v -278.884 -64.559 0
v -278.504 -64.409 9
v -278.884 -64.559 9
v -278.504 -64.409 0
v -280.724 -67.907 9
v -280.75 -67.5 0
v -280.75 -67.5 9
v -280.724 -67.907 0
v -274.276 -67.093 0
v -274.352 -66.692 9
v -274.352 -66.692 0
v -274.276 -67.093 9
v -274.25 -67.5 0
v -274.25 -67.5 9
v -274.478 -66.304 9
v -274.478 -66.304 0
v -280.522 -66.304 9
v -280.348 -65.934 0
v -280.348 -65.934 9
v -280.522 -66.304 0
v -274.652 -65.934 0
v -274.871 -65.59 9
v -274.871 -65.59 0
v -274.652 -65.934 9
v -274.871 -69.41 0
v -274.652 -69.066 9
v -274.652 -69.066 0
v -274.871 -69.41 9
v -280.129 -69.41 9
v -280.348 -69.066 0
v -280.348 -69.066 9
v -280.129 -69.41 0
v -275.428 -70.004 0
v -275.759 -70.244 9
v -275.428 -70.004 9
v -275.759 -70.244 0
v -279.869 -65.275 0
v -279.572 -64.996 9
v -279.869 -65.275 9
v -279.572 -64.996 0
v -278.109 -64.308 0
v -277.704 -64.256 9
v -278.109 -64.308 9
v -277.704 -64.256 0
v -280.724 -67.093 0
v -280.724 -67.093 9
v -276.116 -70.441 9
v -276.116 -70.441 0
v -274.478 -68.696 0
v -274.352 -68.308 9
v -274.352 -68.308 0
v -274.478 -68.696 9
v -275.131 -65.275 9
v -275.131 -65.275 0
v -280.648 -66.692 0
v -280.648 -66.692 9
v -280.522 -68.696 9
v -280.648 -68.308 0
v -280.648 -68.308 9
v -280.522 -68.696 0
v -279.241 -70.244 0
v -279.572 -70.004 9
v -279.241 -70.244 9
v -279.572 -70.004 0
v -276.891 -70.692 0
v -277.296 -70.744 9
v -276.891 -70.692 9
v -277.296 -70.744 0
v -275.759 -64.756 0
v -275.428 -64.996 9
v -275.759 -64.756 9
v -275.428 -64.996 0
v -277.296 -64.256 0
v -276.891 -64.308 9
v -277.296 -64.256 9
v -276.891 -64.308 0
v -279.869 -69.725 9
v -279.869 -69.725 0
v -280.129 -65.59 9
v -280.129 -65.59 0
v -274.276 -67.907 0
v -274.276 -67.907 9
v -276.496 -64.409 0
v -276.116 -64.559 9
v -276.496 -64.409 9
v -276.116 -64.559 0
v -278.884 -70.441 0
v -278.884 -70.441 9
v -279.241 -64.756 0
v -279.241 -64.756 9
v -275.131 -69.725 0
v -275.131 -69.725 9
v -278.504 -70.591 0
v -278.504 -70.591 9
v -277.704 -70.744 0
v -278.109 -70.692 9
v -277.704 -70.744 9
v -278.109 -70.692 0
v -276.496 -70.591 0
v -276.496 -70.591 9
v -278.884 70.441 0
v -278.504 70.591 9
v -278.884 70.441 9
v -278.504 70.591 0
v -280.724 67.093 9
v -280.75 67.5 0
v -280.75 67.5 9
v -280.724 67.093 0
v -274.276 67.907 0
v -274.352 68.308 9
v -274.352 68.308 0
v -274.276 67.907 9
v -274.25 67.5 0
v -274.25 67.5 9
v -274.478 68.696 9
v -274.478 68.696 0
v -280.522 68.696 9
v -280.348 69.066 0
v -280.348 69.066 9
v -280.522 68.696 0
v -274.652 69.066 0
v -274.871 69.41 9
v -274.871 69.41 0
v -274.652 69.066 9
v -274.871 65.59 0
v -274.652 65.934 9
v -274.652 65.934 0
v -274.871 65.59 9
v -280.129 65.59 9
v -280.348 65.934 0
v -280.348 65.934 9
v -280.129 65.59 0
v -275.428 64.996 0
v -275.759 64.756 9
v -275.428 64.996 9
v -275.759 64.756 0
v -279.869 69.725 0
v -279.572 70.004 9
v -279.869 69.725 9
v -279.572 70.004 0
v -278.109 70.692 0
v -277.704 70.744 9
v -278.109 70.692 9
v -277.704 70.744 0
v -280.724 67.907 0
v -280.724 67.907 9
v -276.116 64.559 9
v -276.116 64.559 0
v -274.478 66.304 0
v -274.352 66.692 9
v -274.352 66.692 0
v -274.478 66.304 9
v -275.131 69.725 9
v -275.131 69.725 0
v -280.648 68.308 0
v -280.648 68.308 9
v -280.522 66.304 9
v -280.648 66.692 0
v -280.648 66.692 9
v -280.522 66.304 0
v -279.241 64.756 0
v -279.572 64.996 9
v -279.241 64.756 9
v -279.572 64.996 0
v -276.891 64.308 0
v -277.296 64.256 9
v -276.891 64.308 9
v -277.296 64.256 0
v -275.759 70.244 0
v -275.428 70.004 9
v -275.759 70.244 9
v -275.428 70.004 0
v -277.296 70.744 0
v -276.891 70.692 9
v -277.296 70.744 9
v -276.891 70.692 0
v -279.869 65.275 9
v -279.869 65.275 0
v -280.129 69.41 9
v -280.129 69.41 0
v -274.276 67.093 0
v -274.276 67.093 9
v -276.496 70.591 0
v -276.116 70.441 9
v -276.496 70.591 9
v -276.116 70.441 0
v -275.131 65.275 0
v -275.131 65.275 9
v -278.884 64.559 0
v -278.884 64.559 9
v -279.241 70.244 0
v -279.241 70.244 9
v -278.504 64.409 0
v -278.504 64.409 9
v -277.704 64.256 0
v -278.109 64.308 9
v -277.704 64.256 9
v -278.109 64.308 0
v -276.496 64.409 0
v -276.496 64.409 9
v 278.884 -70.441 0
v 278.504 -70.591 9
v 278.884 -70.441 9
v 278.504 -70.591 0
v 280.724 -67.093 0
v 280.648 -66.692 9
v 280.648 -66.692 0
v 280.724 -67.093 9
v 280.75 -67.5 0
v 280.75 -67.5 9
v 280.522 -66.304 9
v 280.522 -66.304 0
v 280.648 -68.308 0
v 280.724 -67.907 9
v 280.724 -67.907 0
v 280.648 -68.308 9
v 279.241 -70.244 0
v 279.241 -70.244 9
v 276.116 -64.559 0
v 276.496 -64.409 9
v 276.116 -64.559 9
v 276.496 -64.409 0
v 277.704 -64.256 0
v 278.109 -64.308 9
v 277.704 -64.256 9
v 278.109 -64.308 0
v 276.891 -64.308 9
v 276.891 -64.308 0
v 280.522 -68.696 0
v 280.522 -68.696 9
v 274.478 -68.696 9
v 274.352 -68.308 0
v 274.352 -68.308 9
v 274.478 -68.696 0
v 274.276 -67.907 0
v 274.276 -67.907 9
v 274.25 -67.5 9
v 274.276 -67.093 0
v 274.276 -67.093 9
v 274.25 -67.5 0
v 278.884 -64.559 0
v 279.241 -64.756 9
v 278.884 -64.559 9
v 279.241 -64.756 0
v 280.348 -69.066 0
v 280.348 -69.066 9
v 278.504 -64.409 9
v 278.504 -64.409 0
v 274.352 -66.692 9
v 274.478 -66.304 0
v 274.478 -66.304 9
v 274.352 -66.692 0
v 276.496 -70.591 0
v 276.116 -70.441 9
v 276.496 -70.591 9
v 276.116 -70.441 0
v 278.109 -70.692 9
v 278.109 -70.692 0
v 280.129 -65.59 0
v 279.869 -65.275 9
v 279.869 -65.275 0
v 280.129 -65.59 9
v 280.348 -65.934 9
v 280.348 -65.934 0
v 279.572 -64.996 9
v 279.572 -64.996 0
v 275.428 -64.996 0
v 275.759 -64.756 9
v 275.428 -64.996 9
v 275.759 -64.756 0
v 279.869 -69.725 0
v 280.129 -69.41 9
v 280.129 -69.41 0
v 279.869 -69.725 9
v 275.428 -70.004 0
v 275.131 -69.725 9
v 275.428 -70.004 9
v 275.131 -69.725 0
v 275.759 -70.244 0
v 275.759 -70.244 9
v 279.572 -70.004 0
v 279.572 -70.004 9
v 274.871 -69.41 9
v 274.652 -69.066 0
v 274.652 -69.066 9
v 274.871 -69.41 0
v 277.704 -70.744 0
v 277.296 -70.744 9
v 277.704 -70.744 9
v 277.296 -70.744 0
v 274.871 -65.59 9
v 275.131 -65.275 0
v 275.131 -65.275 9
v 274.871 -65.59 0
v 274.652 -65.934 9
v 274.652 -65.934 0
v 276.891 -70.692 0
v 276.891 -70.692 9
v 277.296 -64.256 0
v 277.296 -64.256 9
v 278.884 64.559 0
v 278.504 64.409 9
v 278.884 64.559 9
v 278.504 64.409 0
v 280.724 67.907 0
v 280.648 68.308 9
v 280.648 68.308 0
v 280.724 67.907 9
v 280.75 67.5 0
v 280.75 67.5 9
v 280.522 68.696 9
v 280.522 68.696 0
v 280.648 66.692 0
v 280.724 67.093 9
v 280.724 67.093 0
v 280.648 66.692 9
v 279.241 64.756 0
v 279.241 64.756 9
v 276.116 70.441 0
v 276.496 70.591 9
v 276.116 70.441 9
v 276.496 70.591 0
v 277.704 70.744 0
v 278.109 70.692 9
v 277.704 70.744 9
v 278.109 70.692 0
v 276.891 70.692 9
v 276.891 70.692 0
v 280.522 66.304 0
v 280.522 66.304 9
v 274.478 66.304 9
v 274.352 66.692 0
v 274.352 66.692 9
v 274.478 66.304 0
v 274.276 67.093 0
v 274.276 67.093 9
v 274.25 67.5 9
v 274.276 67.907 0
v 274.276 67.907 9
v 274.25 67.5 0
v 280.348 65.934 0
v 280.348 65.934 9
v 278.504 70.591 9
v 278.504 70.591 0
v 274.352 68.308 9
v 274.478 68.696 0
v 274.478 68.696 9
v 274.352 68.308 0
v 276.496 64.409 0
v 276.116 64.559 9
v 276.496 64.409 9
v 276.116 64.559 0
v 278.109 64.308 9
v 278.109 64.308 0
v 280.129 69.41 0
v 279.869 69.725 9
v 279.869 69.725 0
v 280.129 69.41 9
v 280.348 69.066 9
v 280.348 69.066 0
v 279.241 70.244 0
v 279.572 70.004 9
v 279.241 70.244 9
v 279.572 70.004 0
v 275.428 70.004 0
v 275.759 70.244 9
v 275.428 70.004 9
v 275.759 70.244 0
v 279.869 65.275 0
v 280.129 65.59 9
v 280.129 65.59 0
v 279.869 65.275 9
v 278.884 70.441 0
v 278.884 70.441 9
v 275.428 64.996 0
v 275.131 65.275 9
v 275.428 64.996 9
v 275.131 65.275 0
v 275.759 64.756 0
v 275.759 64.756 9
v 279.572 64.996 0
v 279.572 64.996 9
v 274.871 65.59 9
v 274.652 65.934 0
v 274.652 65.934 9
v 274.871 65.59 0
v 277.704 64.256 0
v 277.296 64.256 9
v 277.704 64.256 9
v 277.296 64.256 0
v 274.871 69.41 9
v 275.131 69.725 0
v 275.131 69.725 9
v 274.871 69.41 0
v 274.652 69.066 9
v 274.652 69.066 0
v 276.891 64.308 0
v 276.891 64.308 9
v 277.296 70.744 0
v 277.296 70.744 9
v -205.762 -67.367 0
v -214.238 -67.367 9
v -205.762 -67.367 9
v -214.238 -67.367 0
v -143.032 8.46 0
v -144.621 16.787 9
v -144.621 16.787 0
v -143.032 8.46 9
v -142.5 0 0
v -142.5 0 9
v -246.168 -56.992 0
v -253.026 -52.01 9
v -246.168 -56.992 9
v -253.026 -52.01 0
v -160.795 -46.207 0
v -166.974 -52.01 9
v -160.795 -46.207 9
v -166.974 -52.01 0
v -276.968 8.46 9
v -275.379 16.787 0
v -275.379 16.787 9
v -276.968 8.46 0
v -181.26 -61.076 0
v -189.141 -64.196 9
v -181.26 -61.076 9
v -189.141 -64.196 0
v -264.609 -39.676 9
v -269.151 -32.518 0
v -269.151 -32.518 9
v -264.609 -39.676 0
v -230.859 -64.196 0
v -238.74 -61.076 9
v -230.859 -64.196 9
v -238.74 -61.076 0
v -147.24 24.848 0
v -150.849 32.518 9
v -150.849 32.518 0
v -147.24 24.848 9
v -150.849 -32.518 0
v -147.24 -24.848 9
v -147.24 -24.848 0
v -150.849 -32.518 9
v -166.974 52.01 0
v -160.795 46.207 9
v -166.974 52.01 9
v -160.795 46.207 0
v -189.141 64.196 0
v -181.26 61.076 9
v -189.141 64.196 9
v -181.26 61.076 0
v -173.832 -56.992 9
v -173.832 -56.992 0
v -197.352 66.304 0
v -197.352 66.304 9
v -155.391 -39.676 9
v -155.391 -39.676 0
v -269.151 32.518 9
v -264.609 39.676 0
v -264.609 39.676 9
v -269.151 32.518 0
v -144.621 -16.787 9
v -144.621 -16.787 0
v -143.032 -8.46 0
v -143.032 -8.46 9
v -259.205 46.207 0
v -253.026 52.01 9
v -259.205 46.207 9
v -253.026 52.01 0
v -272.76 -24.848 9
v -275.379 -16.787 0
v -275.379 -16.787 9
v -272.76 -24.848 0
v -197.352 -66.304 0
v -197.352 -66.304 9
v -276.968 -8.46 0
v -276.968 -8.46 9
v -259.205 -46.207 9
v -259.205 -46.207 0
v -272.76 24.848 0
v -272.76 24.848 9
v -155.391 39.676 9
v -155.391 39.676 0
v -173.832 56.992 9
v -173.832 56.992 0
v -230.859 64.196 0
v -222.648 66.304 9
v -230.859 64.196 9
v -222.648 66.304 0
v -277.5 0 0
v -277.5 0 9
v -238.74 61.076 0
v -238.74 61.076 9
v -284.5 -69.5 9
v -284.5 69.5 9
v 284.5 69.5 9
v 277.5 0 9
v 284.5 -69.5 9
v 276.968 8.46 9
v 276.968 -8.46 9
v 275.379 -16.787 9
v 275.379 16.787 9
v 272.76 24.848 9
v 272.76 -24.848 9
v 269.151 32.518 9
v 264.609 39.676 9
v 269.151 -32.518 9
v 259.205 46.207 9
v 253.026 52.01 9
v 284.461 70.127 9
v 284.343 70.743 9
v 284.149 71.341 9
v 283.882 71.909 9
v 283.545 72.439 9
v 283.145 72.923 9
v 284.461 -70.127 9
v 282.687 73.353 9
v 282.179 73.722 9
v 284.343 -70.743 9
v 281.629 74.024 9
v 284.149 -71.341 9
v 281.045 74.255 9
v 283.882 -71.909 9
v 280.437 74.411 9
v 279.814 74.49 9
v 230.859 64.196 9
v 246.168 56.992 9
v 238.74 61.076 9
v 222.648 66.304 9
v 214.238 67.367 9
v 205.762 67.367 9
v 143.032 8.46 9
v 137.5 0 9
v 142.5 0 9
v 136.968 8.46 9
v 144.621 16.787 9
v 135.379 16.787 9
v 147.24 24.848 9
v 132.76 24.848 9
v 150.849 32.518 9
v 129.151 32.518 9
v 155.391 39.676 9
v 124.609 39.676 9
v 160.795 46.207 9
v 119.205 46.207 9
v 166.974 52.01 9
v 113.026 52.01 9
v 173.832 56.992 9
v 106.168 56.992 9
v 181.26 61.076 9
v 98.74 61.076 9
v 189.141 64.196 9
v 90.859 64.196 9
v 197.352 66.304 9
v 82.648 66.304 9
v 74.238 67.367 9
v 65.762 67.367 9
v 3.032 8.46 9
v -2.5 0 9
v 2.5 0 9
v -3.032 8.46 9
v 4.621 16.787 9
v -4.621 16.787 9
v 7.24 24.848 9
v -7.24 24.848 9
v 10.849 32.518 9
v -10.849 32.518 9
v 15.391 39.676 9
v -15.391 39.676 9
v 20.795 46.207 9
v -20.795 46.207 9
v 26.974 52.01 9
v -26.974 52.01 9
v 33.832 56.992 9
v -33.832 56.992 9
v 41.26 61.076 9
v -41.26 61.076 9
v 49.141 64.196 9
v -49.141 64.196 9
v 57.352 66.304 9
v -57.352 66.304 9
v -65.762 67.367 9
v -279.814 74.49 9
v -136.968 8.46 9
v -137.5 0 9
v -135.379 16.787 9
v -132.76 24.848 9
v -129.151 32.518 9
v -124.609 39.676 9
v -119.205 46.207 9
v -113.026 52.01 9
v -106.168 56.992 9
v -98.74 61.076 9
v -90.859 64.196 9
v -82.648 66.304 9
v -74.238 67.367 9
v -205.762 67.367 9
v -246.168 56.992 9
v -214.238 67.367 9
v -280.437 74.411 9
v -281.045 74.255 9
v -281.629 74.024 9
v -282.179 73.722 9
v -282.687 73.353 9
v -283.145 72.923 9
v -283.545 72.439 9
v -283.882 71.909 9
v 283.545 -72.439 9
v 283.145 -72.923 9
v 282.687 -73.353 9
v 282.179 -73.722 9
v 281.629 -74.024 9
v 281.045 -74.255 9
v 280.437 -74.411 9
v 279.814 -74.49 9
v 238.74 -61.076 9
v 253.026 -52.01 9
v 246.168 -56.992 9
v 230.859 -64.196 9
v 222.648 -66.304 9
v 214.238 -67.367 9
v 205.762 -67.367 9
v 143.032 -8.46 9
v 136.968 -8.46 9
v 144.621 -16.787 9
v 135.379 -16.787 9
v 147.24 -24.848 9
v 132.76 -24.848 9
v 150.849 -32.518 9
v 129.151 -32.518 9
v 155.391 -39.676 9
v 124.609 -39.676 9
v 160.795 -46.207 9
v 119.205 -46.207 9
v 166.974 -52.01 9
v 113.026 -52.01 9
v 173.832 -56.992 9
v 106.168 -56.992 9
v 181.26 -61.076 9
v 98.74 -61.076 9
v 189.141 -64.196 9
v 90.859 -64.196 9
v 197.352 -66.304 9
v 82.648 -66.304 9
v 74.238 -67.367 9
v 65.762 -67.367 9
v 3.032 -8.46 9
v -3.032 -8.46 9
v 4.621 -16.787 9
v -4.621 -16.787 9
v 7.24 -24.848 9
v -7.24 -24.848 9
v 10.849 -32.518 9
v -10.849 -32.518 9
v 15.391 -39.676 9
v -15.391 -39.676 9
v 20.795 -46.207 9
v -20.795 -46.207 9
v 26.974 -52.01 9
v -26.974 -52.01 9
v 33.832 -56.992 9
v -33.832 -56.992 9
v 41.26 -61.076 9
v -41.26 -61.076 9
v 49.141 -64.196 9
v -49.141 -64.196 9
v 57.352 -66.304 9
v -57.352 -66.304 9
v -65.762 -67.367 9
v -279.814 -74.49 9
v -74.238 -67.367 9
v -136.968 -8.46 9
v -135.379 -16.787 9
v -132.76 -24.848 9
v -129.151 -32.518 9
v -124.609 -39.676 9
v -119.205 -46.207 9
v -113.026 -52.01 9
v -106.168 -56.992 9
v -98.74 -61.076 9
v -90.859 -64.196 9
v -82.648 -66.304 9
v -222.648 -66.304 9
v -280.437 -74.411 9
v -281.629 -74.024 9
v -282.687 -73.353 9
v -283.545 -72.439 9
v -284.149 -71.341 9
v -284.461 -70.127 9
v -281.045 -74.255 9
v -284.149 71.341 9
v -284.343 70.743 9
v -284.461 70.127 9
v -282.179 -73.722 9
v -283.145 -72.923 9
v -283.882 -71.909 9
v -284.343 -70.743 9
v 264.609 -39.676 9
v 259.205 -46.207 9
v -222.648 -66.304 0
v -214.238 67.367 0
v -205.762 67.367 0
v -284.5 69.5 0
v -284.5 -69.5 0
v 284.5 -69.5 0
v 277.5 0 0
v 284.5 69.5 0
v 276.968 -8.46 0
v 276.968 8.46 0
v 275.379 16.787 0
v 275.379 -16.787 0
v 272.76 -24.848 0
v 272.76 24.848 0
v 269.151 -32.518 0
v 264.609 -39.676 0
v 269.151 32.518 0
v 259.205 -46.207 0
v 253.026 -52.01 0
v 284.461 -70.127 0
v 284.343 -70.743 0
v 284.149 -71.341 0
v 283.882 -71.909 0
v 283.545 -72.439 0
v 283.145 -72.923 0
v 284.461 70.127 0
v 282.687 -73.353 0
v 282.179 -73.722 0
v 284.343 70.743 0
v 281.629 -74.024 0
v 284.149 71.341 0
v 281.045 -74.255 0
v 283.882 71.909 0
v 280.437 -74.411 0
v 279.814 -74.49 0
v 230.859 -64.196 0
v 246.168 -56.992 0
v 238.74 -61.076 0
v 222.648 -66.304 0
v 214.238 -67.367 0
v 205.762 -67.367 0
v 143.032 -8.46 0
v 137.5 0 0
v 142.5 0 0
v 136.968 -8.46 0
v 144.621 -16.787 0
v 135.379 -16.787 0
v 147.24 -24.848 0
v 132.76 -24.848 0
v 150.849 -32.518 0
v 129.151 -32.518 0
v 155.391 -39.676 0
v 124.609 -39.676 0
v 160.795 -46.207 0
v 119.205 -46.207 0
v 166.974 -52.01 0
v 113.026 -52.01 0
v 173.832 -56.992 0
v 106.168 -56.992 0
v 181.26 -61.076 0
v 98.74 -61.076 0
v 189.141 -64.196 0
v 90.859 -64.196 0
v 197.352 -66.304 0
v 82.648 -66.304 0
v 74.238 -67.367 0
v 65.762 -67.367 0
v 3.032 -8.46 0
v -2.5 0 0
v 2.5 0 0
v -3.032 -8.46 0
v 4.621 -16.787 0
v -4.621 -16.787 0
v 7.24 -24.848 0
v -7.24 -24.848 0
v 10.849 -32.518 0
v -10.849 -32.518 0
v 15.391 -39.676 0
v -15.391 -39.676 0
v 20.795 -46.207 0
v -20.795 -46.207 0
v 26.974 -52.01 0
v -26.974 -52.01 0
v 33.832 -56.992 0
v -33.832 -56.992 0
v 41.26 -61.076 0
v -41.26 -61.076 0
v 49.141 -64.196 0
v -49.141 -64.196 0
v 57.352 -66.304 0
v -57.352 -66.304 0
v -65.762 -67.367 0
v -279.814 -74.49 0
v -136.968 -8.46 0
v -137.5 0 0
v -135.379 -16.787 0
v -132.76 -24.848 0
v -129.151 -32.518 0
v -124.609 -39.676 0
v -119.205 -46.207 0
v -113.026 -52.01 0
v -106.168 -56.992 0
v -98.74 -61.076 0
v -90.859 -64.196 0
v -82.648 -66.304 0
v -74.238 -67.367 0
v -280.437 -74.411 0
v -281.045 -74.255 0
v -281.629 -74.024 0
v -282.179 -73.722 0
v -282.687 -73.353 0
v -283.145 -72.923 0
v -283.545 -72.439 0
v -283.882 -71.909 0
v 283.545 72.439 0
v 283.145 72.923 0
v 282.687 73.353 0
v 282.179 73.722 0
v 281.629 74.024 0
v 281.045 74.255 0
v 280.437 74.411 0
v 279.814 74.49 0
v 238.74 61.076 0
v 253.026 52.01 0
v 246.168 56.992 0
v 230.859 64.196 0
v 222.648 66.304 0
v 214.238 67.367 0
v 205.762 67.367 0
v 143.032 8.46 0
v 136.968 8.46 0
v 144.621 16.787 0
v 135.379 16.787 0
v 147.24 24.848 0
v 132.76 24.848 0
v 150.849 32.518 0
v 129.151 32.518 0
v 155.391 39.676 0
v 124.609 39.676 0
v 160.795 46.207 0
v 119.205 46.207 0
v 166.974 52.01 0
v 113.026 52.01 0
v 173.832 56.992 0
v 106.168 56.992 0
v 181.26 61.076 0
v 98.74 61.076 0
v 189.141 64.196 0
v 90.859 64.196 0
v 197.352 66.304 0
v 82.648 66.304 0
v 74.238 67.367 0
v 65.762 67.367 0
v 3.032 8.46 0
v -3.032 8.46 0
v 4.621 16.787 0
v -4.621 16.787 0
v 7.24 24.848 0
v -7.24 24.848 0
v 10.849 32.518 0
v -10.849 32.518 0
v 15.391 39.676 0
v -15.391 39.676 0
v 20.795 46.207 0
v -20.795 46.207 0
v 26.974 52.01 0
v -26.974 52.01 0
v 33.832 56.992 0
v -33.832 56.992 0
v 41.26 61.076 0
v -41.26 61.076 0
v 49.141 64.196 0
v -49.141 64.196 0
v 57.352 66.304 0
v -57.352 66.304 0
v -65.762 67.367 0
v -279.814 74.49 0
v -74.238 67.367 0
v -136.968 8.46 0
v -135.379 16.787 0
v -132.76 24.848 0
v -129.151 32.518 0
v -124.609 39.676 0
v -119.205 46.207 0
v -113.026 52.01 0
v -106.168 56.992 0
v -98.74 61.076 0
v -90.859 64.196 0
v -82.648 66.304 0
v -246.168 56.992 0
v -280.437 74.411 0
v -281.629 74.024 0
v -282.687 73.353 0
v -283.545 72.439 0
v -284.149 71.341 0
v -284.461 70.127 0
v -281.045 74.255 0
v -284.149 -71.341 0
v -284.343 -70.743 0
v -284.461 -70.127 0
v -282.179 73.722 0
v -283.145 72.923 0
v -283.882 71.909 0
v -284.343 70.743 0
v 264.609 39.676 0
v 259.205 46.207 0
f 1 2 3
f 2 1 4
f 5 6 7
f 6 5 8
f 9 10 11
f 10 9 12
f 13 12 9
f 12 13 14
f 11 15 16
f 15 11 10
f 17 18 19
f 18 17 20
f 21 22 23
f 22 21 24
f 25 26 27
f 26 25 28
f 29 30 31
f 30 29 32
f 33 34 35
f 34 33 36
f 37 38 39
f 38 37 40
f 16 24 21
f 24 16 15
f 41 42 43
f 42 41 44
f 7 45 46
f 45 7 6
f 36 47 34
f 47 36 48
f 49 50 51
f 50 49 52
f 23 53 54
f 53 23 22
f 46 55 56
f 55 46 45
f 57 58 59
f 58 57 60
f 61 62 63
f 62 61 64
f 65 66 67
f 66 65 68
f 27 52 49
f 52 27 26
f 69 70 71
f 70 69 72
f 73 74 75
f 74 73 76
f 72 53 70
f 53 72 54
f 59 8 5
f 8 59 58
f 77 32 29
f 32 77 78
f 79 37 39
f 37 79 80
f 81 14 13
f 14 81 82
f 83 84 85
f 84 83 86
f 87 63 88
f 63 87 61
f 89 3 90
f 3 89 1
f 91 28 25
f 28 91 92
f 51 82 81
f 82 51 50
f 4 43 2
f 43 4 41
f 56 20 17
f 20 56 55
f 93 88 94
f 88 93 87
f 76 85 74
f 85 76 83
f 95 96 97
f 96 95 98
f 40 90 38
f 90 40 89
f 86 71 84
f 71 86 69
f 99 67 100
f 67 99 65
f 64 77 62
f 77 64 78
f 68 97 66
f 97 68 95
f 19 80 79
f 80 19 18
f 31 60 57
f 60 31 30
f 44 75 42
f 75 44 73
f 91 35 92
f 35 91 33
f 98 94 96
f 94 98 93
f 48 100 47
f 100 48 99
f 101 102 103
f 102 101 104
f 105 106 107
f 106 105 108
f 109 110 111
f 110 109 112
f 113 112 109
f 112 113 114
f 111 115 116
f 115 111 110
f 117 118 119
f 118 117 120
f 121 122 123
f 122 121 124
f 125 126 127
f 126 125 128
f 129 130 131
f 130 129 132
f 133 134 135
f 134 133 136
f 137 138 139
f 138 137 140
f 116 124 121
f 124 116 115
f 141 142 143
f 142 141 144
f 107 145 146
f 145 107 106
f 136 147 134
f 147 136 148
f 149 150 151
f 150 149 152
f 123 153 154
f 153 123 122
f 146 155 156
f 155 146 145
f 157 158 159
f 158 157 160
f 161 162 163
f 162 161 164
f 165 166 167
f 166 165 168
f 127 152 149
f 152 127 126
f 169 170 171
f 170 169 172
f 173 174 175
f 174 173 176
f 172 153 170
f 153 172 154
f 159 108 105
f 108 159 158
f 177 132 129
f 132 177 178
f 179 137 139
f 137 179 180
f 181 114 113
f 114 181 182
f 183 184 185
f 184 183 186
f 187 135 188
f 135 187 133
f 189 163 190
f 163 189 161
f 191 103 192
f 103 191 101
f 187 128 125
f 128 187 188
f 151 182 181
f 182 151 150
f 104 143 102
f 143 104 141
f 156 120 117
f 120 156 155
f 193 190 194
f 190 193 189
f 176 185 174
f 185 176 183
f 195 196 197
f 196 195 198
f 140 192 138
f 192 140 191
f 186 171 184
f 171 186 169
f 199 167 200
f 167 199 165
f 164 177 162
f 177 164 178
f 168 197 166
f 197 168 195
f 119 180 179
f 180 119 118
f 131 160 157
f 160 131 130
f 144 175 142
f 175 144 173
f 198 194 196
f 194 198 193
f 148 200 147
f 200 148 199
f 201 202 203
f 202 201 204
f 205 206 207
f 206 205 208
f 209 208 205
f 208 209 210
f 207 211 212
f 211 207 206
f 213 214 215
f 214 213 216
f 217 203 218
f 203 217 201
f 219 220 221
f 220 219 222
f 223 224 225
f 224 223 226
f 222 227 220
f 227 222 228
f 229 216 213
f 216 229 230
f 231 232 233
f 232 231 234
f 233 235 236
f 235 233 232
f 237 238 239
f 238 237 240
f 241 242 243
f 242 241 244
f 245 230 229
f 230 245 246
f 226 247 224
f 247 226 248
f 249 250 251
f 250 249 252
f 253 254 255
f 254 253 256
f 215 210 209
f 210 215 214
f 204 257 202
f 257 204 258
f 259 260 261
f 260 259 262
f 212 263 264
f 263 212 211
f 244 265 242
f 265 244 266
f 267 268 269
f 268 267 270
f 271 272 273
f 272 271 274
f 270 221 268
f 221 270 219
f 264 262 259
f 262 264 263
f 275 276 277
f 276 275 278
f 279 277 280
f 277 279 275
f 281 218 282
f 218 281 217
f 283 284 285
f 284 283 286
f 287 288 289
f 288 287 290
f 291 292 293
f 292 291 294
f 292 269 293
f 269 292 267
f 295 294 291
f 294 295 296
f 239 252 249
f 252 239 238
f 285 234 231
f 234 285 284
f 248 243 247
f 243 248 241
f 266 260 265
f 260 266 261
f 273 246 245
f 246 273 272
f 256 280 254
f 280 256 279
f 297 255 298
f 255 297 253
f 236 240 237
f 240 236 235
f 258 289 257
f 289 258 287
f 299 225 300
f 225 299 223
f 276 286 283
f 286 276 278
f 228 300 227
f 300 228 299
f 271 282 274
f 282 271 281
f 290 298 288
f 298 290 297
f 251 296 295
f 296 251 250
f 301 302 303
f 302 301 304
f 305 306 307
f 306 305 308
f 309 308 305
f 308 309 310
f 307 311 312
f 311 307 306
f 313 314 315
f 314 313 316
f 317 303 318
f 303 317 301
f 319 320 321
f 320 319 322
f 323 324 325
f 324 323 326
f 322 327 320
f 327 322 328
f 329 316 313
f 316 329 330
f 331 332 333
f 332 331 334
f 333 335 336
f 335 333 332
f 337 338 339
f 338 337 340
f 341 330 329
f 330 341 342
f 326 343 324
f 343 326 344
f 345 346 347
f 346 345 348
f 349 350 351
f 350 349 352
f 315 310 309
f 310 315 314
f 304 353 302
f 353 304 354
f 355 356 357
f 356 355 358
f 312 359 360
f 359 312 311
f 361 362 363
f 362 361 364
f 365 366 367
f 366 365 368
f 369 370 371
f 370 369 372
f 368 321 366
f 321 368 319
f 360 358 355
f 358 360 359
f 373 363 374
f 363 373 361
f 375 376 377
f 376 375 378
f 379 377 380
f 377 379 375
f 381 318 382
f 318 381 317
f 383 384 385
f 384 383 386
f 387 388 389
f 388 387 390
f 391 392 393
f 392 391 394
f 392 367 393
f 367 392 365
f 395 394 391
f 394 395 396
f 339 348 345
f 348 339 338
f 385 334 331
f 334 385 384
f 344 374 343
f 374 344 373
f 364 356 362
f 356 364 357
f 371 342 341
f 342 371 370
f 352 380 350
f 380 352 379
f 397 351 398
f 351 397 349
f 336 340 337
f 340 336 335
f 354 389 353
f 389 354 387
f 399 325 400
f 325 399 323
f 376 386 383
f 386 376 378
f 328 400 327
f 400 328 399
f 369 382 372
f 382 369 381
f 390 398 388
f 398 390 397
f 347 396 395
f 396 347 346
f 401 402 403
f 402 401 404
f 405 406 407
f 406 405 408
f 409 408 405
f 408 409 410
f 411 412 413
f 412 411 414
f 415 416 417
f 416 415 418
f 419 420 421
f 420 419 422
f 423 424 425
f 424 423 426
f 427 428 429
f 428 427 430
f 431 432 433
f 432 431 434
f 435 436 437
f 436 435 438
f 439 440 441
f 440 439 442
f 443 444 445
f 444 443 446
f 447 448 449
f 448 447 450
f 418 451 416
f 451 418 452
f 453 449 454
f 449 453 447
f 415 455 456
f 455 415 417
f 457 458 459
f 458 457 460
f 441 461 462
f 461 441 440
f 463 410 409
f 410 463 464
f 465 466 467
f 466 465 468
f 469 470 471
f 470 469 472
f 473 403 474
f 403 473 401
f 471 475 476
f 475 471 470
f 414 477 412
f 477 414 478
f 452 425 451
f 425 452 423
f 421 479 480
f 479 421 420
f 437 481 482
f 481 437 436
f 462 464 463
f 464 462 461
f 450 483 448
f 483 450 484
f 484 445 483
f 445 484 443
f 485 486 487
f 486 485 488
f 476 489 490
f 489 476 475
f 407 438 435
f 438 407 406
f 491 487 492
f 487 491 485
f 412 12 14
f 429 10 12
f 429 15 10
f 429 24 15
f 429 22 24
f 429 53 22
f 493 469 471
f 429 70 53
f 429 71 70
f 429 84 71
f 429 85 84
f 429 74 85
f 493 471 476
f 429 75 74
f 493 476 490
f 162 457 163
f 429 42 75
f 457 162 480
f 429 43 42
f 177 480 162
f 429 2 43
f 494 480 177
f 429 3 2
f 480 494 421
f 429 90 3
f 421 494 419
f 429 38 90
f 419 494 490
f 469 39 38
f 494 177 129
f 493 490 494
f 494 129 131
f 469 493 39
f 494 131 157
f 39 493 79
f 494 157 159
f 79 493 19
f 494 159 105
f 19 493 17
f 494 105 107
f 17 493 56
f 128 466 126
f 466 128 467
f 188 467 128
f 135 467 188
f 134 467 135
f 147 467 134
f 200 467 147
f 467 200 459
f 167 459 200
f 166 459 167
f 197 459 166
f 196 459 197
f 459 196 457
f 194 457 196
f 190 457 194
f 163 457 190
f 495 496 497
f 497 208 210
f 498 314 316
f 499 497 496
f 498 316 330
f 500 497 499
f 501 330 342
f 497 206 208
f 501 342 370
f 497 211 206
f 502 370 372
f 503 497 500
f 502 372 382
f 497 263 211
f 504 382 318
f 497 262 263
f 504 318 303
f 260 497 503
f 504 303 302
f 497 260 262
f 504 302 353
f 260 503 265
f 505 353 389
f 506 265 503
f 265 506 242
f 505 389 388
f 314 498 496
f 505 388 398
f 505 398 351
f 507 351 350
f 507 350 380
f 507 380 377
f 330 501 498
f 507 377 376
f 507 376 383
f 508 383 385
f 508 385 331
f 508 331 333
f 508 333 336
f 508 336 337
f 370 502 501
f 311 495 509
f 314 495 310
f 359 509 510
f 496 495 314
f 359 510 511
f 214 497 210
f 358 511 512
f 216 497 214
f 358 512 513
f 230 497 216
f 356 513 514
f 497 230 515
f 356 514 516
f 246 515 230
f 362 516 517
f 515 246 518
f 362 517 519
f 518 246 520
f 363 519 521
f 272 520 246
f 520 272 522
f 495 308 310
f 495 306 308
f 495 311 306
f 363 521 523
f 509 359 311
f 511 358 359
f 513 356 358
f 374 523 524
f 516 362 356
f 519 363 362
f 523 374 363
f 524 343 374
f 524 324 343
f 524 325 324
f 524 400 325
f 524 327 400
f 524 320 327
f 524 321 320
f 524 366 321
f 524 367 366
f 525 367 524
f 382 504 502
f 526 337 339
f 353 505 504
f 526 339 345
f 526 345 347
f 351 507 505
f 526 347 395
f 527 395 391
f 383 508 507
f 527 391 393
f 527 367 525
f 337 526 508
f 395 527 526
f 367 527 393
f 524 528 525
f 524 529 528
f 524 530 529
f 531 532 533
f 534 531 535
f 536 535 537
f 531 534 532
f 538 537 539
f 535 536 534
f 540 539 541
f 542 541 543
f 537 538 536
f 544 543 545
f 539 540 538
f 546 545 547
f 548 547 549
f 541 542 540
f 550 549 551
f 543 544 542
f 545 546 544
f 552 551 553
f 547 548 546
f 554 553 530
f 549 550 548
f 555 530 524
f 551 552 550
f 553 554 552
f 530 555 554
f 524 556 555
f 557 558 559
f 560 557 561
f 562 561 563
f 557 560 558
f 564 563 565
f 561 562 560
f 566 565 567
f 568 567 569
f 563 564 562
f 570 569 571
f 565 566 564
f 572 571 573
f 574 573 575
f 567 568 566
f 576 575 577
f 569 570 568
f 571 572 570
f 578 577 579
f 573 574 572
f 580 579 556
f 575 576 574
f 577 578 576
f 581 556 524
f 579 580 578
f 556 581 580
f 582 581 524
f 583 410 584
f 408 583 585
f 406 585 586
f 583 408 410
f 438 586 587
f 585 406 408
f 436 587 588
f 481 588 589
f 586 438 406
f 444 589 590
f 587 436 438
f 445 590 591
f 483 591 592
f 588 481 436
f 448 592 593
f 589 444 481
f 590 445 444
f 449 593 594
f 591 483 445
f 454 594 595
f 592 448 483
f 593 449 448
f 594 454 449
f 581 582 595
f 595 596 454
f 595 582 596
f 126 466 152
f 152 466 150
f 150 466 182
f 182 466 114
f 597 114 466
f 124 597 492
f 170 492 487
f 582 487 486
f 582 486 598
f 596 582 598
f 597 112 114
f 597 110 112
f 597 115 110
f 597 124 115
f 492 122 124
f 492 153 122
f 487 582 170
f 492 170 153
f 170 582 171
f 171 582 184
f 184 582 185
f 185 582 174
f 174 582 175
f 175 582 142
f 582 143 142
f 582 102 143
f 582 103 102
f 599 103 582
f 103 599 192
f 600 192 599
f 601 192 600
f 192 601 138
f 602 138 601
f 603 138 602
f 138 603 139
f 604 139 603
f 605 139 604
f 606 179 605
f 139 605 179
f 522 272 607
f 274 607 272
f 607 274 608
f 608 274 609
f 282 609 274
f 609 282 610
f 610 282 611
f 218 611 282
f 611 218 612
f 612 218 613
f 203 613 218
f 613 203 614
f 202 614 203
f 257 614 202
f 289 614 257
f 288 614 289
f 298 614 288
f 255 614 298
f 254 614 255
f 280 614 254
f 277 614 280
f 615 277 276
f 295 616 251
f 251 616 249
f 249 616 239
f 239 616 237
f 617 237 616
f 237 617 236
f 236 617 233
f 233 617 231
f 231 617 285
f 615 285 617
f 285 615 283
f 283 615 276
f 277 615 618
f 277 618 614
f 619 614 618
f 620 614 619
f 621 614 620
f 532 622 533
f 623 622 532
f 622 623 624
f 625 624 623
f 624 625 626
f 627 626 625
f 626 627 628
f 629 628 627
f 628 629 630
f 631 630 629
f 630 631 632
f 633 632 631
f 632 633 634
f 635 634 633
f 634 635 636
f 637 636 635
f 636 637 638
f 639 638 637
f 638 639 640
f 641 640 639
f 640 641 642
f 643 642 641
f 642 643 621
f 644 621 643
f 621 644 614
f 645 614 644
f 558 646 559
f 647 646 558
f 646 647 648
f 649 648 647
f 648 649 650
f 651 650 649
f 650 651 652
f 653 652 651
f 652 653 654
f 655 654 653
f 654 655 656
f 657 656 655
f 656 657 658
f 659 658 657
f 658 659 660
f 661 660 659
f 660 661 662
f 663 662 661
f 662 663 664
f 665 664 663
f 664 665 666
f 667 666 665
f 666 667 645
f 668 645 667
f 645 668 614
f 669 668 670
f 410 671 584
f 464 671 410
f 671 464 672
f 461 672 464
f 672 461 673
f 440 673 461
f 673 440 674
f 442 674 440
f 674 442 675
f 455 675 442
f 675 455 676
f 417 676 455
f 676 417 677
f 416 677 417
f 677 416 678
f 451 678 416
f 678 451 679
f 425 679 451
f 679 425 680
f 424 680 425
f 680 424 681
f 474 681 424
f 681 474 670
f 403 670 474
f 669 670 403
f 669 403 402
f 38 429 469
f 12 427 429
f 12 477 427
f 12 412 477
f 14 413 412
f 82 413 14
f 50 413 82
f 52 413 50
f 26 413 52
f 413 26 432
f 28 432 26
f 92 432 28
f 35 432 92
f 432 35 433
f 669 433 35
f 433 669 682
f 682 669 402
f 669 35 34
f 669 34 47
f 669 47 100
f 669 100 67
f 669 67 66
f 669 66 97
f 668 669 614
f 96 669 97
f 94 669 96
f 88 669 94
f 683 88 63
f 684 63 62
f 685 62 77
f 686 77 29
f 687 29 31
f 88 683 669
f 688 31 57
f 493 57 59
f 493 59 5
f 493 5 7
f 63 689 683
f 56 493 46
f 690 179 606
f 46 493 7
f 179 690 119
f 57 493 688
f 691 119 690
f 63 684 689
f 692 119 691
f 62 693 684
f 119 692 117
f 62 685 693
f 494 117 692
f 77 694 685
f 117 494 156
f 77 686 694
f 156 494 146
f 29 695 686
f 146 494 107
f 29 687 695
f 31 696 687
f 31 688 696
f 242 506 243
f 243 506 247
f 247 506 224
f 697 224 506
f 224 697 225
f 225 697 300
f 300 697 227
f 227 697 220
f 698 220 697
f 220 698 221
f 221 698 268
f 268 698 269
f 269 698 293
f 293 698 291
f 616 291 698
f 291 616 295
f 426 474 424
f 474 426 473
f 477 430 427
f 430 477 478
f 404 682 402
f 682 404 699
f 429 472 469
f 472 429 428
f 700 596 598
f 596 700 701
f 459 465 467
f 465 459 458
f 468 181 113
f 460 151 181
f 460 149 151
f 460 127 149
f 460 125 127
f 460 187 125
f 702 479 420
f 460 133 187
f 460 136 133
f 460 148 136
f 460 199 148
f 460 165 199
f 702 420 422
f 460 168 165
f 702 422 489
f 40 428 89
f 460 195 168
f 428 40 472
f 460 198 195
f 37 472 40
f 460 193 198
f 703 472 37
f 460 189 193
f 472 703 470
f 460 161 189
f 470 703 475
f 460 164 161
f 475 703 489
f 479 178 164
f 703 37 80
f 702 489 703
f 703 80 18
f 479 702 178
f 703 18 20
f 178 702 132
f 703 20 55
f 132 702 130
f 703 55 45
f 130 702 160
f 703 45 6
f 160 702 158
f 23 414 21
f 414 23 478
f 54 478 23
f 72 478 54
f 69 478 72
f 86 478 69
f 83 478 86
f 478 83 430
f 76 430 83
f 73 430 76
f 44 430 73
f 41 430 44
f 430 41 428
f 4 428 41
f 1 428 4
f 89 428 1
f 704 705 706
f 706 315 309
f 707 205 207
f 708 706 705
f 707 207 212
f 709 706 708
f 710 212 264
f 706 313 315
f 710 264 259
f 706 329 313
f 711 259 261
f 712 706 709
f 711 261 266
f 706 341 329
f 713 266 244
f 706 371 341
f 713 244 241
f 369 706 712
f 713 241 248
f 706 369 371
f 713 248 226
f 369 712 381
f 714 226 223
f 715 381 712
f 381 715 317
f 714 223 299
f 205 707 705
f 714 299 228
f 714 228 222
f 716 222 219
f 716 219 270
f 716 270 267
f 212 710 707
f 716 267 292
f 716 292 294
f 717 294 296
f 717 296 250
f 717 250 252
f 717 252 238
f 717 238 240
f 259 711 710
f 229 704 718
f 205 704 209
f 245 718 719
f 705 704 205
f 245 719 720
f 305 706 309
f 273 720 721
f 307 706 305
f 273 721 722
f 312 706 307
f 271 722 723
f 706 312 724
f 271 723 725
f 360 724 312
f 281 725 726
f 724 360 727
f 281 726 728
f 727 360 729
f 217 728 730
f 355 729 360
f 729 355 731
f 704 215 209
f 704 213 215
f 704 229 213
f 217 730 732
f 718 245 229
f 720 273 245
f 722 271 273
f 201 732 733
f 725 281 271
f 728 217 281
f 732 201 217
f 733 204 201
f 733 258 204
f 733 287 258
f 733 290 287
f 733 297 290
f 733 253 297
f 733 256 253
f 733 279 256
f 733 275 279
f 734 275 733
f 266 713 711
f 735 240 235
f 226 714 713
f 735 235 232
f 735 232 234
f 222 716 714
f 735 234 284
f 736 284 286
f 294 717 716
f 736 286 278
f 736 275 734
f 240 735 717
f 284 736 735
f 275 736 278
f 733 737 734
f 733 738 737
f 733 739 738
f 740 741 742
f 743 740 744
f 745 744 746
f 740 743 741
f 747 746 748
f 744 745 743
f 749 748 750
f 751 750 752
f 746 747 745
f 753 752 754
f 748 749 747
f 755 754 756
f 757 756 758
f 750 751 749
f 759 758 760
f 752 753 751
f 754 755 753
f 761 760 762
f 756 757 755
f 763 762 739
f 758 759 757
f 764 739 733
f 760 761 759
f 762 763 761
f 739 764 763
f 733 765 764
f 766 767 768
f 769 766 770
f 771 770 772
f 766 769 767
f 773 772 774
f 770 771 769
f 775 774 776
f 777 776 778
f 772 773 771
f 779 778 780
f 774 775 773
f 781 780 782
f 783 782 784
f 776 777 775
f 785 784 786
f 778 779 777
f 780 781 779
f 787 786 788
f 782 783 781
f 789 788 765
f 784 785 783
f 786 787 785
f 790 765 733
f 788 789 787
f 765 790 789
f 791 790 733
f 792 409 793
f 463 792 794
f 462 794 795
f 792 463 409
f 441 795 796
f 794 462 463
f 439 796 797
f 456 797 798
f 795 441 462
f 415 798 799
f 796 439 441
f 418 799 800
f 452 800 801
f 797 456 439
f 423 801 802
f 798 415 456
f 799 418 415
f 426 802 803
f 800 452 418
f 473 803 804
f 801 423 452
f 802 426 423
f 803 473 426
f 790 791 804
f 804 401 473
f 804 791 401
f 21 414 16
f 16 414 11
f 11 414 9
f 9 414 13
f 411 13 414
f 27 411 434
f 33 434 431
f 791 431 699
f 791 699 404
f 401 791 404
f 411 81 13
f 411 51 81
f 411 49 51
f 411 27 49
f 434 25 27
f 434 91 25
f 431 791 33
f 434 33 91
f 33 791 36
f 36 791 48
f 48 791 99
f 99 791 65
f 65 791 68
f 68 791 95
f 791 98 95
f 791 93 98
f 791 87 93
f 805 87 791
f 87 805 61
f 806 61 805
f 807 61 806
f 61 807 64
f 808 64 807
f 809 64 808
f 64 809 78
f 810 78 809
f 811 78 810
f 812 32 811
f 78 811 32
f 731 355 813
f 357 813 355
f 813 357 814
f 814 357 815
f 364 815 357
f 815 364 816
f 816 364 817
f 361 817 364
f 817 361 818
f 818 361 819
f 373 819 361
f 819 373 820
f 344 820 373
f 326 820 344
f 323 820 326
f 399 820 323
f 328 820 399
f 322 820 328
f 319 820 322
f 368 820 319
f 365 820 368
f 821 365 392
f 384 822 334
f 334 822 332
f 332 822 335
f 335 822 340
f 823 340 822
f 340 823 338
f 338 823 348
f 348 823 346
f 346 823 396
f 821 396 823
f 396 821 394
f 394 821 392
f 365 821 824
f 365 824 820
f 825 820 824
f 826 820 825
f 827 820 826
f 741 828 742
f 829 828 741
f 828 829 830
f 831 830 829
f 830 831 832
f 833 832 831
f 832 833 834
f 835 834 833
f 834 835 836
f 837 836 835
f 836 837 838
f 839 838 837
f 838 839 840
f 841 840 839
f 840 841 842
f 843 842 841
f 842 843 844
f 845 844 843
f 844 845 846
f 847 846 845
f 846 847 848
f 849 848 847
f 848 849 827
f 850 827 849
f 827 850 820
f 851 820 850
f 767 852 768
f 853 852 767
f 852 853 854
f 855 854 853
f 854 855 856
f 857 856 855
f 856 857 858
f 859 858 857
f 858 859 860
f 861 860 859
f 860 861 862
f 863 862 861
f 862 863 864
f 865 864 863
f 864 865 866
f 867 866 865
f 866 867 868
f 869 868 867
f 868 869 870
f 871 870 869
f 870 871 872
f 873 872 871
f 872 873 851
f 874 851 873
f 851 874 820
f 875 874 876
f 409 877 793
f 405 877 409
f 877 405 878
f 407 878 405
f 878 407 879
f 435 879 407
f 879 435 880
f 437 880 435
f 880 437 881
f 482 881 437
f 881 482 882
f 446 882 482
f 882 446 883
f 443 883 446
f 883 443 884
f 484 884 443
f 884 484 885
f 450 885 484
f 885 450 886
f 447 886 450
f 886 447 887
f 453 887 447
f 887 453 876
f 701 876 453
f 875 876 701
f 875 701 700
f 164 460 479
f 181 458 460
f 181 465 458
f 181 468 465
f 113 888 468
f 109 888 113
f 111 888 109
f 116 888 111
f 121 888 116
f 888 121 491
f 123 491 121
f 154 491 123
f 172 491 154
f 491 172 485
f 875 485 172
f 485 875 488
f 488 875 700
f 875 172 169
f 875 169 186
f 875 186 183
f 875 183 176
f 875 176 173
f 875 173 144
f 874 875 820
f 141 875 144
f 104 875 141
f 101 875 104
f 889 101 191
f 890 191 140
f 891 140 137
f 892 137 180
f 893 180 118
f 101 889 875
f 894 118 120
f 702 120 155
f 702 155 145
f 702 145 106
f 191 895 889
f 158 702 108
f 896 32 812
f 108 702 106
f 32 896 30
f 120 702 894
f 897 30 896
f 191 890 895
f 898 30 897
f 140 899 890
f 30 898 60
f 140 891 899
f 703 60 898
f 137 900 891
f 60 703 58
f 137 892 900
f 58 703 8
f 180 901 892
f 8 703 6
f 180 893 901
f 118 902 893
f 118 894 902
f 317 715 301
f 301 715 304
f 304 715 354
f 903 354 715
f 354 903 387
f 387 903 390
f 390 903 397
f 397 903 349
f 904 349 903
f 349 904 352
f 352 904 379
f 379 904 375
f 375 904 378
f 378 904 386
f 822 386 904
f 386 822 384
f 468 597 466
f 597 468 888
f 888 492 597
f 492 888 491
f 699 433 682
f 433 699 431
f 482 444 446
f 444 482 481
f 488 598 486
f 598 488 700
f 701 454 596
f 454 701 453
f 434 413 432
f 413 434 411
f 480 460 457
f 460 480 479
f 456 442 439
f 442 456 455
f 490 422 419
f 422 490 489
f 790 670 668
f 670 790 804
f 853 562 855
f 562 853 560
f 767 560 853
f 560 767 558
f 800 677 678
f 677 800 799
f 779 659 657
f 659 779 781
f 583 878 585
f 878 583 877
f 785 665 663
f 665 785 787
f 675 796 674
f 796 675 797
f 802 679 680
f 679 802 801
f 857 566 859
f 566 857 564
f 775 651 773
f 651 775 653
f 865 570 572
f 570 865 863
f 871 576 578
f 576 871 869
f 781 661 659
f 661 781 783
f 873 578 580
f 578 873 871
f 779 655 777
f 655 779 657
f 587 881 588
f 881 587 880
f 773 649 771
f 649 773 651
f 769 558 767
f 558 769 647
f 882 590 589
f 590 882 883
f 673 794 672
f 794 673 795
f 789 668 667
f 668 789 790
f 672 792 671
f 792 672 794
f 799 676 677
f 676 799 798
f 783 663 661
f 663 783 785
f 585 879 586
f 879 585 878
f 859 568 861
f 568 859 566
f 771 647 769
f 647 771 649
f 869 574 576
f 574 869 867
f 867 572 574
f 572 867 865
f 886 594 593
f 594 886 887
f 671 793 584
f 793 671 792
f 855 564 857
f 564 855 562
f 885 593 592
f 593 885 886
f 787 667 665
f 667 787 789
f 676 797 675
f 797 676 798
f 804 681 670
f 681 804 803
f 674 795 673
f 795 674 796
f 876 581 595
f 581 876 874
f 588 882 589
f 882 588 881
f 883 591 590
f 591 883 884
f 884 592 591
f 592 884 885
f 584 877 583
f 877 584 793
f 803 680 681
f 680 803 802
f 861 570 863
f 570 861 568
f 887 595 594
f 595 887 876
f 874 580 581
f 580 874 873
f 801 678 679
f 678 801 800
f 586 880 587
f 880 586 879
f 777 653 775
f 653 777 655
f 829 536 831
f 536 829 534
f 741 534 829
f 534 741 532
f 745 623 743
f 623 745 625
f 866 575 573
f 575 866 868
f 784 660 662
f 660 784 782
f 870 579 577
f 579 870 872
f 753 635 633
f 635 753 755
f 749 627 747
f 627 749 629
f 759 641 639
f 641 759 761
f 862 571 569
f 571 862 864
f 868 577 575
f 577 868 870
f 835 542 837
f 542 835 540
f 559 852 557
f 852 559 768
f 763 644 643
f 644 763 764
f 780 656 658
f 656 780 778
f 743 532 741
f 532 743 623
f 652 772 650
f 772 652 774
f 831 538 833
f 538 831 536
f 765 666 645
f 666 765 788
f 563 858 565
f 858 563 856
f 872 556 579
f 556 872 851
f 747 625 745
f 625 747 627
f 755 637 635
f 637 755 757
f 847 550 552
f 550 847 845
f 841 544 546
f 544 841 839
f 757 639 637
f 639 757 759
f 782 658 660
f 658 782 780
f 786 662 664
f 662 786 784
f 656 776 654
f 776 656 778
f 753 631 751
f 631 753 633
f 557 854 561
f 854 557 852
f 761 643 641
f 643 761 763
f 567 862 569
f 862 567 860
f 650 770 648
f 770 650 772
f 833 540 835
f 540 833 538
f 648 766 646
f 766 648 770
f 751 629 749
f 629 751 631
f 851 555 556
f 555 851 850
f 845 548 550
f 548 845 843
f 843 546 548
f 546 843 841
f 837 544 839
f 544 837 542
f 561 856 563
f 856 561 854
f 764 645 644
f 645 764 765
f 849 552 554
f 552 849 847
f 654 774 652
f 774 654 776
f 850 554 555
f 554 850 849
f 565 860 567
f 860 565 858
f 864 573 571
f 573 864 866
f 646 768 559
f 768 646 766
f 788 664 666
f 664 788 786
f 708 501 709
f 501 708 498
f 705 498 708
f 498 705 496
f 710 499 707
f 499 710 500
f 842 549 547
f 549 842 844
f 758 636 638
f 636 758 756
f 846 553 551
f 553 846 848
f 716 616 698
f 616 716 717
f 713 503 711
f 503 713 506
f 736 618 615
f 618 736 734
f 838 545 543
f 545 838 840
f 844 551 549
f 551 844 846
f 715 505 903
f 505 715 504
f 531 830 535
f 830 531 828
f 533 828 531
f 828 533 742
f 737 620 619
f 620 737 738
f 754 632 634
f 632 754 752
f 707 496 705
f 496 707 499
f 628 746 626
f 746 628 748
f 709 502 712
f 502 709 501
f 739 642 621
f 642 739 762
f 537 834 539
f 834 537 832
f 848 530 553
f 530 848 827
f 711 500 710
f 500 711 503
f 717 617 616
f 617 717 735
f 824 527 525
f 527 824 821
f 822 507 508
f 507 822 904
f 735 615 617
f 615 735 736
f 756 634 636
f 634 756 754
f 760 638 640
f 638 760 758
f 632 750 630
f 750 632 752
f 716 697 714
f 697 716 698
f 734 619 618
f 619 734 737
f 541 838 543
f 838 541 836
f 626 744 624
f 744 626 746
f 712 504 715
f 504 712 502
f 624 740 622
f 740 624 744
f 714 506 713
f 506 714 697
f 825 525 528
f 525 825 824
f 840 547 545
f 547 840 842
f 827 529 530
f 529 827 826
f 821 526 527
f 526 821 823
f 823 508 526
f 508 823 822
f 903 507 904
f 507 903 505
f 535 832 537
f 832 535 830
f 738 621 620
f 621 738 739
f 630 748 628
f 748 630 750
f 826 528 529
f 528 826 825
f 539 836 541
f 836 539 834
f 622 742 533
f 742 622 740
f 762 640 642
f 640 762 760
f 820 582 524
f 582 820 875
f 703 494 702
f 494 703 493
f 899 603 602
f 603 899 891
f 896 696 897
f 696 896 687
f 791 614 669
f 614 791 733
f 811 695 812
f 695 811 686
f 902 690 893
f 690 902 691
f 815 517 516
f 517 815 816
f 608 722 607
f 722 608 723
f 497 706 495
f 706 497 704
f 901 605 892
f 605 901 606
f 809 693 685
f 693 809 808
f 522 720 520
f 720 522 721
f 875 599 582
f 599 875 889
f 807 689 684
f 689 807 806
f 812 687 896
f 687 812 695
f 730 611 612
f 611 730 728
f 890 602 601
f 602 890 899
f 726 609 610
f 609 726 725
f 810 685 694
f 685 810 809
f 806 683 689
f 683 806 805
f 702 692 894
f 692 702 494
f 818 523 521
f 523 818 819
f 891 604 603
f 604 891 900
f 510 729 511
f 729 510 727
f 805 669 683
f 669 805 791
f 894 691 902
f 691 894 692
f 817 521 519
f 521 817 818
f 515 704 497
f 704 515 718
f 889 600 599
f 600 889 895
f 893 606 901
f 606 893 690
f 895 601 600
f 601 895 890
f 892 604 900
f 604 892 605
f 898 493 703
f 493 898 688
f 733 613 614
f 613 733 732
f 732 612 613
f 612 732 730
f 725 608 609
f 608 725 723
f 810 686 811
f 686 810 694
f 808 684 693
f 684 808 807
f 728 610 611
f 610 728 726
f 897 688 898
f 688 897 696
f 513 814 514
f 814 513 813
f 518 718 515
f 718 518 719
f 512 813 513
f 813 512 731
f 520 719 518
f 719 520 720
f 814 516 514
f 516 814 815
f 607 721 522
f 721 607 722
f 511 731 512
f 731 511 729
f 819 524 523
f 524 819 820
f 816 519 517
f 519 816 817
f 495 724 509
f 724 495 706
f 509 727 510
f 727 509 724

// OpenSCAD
$fn = 50;


difference() {
	union() {
		hull() {
			translate(v = [-279.5000000000, 69.5000000000, 0]) {
				cylinder(h = 9, r = 5);
			}
			translate(v = [279.5000000000, 69.5000000000, 0]) {
				cylinder(h = 9, r = 5);
			}
			translate(v = [-279.5000000000, -69.5000000000, 0]) {
				cylinder(h = 9, r = 5);
			}
			translate(v = [279.5000000000, -69.5000000000, 0]) {
				cylinder(h = 9, r = 5);
			}
		}
	}
	union() {
		#translate(v = [-277.5000000000, -67.5000000000, -100.0000000000]) {
			cylinder(h = 200, r = 3.2500000000);
		}
		#translate(v = [-277.5000000000, 67.5000000000, -100.0000000000]) {
			cylinder(h = 200, r = 3.2500000000);
		}
		#translate(v = [277.5000000000, -67.5000000000, -100.0000000000]) {
			cylinder(h = 200, r = 3.2500000000);
		}
		#translate(v = [277.5000000000, 67.5000000000, -100.0000000000]) {
			cylinder(h = 200, r = 3.2500000000);
		}
		#translate(v = [-210.0000000000, 0, 0]) {
			cylinder(h = 9, r = 67.5000000000);
		}
		#translate(v = [-70.0000000000, 0, 0]) {
			cylinder(h = 9, r = 67.5000000000);
		}
		#translate(v = [70.0000000000, 0, 0]) {
			cylinder(h = 9, r = 67.5000000000);
		}
		#translate(v = [210.0000000000, 0, 0]) {
			cylinder(h = 9, r = 67.5000000000);
		}
	}
}
